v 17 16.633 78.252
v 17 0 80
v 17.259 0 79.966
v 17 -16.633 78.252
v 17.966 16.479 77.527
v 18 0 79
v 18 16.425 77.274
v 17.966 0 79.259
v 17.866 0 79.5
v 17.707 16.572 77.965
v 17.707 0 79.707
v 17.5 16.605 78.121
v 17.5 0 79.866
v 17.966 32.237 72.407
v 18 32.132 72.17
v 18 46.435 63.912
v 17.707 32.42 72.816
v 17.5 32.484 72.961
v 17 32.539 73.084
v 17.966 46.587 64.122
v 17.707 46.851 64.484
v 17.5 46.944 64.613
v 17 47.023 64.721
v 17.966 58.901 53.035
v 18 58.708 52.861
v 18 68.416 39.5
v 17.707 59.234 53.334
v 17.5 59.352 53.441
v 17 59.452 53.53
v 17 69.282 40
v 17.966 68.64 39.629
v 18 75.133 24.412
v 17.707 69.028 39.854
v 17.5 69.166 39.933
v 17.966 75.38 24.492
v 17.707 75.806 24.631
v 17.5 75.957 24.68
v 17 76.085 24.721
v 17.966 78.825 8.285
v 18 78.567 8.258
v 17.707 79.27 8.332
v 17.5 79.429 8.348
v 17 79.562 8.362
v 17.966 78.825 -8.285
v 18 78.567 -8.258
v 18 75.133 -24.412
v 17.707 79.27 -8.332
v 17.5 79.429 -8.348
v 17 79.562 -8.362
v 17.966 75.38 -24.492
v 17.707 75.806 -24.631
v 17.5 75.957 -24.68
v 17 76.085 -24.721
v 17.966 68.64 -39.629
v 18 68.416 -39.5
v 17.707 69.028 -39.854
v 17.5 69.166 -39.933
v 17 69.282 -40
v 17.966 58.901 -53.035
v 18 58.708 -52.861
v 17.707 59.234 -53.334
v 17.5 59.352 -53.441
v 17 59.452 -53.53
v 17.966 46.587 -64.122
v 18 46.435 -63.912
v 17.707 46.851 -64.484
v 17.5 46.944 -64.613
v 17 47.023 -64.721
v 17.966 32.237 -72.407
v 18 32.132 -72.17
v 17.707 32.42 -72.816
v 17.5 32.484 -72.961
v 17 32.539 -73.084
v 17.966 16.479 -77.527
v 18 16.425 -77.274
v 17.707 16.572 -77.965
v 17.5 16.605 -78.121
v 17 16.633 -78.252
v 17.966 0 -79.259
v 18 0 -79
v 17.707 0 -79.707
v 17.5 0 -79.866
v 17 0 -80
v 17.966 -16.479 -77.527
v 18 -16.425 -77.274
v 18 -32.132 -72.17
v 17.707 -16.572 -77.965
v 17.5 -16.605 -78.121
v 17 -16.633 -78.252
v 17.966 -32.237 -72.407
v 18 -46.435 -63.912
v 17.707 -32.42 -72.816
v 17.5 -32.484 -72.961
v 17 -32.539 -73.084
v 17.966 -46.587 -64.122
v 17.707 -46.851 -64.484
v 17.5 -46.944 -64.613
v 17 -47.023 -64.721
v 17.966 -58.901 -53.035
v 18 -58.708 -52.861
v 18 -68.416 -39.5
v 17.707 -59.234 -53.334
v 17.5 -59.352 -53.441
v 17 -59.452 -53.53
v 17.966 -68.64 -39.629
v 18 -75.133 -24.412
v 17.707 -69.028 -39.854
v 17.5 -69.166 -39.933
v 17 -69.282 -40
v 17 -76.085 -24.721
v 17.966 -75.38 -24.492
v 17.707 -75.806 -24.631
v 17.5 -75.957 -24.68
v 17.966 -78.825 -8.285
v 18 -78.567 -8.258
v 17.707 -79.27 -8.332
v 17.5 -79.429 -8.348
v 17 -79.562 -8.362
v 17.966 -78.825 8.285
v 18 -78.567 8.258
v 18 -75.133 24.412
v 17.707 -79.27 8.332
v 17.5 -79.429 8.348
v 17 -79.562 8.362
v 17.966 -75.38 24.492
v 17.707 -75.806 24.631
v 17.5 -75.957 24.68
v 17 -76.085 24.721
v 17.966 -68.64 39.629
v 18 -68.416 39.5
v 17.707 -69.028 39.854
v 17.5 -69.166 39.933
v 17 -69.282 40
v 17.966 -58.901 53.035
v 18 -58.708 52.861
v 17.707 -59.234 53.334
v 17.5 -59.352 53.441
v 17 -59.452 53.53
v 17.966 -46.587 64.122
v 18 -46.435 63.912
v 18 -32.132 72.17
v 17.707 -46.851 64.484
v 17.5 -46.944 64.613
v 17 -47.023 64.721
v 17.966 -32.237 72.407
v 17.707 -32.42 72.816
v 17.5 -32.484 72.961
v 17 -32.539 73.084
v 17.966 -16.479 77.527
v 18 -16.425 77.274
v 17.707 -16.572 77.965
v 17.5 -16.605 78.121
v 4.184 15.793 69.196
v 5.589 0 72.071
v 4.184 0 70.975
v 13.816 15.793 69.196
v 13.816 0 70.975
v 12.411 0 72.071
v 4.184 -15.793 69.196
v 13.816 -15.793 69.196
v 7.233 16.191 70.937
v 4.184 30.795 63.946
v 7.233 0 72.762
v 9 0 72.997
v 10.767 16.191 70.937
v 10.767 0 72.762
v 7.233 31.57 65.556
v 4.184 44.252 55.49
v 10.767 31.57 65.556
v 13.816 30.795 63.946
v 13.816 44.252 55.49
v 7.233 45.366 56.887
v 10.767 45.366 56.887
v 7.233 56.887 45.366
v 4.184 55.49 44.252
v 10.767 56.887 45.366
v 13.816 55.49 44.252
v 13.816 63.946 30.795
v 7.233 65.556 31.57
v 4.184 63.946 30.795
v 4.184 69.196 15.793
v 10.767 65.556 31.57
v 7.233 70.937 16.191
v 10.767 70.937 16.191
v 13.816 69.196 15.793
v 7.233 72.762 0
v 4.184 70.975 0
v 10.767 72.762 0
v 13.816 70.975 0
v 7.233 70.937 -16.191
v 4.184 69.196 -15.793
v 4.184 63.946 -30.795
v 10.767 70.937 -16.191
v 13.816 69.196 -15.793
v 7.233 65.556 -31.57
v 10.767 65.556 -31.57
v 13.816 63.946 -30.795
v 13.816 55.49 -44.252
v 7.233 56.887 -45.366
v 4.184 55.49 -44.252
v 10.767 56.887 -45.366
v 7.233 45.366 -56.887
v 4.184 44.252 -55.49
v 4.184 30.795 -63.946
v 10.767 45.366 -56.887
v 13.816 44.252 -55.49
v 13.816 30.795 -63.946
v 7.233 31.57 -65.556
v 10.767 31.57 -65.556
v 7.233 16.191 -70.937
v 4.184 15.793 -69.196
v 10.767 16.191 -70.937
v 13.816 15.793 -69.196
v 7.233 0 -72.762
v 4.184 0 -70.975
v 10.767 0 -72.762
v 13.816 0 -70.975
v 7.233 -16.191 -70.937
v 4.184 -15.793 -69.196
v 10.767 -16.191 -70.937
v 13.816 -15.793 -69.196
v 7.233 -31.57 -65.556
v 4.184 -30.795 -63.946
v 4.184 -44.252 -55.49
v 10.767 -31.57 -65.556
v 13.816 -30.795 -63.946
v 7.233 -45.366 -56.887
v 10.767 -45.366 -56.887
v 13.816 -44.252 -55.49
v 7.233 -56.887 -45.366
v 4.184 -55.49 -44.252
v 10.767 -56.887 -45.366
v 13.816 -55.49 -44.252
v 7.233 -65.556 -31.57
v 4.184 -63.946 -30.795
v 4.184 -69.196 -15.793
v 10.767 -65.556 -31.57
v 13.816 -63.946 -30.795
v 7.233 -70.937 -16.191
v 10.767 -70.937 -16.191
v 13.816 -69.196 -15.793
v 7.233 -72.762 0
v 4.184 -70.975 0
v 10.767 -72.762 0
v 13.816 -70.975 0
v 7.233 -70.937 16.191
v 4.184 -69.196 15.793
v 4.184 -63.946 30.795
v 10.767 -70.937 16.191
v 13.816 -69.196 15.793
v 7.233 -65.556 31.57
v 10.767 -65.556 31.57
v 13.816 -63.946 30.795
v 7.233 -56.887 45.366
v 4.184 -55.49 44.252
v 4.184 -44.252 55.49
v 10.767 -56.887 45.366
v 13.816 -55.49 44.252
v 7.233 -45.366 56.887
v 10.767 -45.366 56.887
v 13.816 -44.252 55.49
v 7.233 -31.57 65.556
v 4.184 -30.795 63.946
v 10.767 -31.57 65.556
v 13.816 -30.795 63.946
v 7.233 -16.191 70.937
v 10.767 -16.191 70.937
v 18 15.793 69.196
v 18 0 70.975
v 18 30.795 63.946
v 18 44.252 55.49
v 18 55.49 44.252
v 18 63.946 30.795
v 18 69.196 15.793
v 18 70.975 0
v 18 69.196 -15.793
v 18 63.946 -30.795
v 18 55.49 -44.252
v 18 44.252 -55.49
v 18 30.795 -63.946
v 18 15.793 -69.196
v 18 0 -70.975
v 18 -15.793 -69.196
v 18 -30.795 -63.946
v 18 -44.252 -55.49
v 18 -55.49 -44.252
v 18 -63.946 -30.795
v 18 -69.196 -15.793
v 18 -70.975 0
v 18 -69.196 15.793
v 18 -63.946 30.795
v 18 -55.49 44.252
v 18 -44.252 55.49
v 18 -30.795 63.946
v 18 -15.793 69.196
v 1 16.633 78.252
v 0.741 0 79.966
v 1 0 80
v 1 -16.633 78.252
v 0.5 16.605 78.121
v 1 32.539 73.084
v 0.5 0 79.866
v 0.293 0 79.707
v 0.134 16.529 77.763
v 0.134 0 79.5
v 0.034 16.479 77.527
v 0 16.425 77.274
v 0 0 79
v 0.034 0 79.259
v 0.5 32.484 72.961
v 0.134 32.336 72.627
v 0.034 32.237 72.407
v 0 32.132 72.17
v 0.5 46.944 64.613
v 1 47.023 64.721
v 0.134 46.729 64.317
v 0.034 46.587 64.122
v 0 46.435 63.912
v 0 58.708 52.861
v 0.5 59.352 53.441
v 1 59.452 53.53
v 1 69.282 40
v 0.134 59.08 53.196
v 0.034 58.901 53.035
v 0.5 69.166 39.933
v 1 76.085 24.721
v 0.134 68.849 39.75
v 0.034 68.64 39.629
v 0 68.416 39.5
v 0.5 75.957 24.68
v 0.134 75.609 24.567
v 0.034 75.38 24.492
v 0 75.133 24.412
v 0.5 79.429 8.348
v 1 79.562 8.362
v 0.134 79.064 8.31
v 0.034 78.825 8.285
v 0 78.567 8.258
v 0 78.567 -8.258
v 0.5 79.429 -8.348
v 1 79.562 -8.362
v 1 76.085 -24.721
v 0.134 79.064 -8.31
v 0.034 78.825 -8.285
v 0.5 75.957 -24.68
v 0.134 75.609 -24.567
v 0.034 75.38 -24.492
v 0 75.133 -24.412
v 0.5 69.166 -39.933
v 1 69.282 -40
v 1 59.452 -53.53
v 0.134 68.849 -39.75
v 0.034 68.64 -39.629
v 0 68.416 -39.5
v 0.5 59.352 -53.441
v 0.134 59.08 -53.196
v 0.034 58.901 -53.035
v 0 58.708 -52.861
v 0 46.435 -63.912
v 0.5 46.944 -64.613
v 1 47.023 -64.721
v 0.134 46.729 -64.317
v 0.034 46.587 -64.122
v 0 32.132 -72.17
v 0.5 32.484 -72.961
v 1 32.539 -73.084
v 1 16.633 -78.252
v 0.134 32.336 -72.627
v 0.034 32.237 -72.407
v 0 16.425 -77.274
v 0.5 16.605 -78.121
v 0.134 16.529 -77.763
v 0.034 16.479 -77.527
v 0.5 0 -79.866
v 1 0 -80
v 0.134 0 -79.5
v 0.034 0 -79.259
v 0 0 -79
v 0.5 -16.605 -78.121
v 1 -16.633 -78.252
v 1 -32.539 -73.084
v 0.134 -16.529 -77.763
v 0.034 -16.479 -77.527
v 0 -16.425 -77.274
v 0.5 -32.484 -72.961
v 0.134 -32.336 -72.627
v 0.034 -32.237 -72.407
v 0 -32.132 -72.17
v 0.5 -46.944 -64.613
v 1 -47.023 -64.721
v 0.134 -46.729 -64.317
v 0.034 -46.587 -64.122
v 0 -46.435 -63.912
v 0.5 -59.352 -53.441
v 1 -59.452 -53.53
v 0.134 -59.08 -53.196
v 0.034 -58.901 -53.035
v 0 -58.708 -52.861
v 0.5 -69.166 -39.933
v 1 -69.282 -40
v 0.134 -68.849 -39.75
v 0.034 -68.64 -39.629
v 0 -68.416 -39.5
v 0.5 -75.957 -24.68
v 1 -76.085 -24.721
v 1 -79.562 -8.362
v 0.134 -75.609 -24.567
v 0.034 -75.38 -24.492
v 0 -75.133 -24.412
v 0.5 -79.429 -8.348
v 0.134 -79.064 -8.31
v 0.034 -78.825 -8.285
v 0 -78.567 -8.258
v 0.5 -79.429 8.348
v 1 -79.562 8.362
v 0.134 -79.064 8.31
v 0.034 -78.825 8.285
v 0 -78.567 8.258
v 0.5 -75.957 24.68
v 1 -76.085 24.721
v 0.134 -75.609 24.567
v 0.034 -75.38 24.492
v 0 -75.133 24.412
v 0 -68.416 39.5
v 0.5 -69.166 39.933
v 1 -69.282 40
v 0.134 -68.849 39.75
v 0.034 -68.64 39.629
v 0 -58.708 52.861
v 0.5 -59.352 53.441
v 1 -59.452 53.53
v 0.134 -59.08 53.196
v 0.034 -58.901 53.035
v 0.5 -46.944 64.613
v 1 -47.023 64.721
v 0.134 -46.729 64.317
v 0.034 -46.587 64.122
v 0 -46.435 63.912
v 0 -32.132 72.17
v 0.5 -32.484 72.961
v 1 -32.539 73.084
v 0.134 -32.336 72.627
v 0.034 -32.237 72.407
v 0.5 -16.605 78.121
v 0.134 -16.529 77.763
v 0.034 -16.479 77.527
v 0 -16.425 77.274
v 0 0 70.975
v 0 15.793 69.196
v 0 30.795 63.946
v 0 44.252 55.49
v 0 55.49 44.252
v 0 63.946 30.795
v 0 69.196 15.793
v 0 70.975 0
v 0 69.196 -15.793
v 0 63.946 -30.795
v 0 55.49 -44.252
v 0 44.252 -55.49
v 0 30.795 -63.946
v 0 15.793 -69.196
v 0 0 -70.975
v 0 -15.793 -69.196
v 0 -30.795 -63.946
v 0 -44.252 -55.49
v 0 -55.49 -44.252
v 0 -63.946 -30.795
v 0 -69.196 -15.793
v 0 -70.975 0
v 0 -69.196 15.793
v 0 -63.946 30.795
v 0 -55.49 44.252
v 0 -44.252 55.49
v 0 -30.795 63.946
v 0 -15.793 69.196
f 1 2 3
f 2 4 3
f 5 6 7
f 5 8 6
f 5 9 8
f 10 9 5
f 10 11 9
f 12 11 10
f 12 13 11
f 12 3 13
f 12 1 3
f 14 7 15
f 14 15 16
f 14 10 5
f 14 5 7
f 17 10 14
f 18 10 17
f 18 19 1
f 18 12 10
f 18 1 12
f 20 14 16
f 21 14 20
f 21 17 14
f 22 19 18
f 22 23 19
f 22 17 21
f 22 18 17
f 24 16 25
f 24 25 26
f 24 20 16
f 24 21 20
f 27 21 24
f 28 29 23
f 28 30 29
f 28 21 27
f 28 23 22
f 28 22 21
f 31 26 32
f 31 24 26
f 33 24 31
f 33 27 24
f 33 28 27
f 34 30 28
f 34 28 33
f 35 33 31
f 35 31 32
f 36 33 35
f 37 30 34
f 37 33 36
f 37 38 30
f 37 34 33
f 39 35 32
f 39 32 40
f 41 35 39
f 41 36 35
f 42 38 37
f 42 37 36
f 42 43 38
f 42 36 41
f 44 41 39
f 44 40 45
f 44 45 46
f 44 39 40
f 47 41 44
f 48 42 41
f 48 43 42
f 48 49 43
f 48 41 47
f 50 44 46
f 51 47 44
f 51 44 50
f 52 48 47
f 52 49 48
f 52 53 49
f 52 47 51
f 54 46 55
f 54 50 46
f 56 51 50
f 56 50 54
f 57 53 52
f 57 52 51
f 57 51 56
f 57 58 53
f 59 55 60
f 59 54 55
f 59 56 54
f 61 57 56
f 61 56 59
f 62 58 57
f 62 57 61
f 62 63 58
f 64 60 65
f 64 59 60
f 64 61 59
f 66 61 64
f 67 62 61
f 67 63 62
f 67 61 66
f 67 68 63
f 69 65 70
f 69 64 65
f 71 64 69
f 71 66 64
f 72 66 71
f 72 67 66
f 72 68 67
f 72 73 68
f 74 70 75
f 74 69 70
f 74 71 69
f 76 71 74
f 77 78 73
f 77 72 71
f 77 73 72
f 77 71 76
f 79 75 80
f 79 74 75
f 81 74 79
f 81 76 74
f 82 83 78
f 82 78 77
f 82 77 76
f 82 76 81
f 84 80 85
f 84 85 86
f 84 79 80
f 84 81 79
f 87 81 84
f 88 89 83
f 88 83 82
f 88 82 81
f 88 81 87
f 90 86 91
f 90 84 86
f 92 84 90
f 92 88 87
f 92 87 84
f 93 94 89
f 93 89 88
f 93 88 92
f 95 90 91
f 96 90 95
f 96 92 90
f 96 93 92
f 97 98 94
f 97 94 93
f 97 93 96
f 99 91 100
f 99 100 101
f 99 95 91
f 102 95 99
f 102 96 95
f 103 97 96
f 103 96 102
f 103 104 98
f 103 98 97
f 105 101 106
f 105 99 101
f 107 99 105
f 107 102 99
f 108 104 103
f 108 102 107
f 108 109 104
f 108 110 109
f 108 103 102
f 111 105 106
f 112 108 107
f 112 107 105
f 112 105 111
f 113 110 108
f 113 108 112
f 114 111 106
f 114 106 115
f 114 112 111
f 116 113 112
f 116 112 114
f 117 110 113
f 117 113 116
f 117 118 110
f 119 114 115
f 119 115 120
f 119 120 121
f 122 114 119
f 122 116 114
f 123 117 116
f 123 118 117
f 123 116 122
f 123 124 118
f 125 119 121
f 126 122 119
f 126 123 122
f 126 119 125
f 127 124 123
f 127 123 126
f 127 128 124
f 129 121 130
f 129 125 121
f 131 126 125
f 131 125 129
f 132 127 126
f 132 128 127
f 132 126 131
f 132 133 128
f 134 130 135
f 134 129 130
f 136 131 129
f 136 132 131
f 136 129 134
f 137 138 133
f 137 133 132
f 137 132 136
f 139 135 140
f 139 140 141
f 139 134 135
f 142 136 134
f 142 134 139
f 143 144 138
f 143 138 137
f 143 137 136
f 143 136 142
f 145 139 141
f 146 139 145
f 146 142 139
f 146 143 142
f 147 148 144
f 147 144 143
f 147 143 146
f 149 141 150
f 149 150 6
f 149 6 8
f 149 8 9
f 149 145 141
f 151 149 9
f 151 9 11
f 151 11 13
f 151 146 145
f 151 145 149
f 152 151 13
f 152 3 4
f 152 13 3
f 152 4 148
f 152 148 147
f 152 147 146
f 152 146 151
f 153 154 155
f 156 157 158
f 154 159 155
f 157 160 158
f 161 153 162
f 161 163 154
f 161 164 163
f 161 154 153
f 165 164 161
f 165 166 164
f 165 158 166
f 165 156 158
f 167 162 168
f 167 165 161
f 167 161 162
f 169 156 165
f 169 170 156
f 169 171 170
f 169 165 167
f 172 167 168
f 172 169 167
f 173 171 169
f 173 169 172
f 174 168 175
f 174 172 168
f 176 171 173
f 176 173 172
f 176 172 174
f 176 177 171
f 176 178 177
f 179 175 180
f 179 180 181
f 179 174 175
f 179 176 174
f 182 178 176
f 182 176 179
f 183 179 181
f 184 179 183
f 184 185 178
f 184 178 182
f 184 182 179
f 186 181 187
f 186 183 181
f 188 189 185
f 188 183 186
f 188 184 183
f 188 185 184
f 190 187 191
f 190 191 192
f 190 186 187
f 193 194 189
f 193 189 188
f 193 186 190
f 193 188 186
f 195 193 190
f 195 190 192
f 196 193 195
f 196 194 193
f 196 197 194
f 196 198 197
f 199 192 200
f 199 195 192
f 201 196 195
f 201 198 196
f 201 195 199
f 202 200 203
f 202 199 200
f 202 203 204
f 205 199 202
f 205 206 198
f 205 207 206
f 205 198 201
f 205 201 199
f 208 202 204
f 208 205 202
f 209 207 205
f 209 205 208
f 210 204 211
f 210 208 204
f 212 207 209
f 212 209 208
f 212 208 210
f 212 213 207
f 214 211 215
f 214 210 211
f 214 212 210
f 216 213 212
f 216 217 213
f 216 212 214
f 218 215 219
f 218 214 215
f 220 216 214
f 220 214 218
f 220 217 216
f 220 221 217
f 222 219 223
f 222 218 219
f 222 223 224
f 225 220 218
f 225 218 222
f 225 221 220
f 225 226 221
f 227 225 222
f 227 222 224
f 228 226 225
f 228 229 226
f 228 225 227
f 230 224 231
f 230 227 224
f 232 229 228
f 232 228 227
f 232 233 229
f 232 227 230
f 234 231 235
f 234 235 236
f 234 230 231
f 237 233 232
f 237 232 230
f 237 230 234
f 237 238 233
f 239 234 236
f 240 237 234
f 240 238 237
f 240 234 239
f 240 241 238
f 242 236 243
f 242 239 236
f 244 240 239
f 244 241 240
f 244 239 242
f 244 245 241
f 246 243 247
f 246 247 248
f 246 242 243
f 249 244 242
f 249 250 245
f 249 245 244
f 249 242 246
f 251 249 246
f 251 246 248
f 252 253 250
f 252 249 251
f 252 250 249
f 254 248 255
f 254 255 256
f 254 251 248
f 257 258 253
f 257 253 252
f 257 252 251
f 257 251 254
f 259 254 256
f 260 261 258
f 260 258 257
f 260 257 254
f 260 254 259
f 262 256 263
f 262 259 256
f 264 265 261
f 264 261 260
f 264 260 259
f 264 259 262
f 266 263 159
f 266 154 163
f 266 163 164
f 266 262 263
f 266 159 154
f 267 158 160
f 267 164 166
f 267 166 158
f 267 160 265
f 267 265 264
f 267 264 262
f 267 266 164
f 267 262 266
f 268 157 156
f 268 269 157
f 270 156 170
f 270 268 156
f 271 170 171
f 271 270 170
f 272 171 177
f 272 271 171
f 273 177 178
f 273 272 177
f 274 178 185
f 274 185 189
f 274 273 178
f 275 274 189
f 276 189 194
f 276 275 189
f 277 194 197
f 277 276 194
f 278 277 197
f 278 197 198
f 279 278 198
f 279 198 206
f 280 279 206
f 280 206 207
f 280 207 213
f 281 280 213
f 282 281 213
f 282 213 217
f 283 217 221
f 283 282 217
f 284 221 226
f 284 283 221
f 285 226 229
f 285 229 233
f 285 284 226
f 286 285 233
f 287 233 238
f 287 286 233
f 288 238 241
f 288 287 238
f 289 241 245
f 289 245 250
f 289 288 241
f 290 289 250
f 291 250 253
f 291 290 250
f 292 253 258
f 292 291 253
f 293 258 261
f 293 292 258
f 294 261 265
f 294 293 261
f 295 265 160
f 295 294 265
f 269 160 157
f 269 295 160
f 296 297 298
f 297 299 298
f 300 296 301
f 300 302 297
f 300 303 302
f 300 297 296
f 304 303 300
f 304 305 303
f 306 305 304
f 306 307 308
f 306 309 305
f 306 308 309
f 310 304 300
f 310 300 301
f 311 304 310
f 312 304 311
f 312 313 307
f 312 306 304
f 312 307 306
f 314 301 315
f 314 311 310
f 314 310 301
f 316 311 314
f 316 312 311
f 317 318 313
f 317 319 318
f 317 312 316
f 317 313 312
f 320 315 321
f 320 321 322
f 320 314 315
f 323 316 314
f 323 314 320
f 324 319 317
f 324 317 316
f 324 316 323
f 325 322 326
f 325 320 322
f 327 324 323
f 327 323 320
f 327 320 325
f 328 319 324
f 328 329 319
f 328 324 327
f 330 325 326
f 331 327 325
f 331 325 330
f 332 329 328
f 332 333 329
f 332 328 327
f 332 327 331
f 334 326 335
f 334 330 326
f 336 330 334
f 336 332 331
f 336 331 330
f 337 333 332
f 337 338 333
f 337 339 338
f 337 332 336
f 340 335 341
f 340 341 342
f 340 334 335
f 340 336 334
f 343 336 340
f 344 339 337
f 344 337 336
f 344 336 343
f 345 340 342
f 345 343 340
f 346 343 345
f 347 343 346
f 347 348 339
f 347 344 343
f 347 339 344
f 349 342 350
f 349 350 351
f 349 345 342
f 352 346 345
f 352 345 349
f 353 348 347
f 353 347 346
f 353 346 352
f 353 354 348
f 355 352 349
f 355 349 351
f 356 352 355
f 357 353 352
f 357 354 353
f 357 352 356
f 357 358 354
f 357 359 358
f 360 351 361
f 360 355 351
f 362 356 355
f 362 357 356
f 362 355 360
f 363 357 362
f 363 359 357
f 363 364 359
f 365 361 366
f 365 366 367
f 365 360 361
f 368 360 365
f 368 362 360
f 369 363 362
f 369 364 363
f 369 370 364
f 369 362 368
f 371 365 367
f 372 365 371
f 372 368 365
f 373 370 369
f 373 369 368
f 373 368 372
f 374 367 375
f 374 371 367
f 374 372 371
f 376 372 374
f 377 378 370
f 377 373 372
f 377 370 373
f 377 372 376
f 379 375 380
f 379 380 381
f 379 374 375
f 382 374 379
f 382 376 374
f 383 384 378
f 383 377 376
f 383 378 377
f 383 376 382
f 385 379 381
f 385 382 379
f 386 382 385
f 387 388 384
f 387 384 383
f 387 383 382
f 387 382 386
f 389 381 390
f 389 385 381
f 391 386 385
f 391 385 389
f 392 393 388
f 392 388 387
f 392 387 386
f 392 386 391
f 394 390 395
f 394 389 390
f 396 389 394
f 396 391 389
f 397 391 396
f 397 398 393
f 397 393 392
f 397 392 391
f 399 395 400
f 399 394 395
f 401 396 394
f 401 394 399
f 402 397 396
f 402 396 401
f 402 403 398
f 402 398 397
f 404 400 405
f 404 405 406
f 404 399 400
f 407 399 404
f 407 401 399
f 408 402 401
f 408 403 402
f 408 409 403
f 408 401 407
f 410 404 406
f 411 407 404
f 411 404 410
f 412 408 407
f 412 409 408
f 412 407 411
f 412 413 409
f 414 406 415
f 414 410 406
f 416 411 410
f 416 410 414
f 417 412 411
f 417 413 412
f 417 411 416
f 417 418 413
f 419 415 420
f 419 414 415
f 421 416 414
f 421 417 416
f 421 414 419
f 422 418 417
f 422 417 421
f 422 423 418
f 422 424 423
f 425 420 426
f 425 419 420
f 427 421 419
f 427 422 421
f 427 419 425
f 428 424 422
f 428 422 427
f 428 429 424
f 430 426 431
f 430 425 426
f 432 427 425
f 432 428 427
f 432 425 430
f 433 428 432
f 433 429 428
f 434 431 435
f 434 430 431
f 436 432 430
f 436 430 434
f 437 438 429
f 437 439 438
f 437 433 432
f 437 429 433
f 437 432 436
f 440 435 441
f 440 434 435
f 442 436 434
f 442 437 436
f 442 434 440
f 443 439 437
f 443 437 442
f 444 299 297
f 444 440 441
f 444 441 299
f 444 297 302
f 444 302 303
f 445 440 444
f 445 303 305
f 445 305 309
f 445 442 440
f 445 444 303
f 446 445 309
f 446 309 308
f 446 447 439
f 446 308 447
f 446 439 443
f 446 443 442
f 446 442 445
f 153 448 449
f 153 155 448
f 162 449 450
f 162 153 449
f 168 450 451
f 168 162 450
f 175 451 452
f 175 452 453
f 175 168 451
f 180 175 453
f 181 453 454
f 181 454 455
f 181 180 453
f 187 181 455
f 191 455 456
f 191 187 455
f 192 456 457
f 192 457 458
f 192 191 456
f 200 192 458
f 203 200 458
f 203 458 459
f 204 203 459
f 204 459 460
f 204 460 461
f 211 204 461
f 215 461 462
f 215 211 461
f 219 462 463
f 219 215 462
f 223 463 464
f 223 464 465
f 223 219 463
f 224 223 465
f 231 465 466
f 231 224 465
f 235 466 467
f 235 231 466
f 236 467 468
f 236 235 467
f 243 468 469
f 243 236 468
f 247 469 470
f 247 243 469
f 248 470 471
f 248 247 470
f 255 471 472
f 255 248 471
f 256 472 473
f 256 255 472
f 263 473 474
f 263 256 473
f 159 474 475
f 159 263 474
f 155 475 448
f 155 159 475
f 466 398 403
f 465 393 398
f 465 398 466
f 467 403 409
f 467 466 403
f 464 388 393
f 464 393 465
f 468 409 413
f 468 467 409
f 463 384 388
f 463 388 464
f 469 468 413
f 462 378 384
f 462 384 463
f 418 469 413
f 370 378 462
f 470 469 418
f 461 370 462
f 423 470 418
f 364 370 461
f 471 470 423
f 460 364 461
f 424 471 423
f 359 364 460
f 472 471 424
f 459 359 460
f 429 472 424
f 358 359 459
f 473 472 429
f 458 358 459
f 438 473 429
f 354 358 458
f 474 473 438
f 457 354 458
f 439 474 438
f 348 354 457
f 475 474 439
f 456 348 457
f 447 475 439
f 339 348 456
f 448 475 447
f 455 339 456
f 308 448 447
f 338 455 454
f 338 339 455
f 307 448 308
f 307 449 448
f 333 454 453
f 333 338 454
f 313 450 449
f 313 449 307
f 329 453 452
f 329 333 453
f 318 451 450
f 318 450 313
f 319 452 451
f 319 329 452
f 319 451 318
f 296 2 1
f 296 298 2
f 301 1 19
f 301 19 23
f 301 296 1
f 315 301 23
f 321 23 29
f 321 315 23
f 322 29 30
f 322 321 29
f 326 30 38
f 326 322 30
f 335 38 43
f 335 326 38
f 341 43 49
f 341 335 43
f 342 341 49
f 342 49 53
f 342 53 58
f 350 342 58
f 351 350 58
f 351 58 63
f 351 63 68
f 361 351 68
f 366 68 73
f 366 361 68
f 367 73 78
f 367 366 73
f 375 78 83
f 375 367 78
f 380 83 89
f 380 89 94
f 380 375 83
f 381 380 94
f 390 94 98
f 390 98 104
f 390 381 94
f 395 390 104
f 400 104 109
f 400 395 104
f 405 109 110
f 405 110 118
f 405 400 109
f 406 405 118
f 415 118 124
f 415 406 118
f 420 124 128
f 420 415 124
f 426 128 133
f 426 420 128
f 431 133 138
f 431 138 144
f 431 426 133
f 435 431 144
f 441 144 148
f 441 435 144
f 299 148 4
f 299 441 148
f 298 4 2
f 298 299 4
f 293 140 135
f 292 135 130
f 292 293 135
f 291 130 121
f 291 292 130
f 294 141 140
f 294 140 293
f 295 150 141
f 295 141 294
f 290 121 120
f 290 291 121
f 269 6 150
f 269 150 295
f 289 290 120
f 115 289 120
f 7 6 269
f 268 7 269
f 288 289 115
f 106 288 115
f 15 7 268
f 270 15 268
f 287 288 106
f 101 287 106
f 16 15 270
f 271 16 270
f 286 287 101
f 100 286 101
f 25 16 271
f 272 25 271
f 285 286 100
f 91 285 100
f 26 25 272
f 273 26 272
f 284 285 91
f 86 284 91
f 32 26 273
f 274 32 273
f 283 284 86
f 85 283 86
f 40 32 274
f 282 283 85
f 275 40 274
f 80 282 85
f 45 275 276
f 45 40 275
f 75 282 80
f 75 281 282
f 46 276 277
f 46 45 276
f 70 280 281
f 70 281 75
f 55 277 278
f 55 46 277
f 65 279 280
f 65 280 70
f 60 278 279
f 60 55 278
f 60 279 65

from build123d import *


with BuildPart() as part:
    # Schizzo1 → Rivoluzione1 (revolve)
    with BuildSketch(Plane.XY, mode=Mode.PRIVATE) as rivoluzione1_sk:
        with BuildLine():
            Line((0, 79), (0, 70.975))
            Line((0, 70.975), (4.183737549, 70.975))
            ThreePointArc((4.183737549, 70.975), (9, 72.997), (13.816262451, 70.975))
            Line((13.816262451, 70.975), (18, 70.975))
            Line((18, 70.975), (18, 79))
            ThreePointArc((18, 79), (17.707106781, 79.707106781), (17, 80))
            Line((17, 80), (1, 80))
            ThreePointArc((1, 80), (0.292893219, 79.707106781), (0, 79))
        make_face()
    revolve(rivoluzione1_sk.sketch.rotate(Axis((200, 0, 0), (-1, 0, 0)), 270), axis=Axis((200, 0, 0), (-1, 0, 0)))


solid = part.part
